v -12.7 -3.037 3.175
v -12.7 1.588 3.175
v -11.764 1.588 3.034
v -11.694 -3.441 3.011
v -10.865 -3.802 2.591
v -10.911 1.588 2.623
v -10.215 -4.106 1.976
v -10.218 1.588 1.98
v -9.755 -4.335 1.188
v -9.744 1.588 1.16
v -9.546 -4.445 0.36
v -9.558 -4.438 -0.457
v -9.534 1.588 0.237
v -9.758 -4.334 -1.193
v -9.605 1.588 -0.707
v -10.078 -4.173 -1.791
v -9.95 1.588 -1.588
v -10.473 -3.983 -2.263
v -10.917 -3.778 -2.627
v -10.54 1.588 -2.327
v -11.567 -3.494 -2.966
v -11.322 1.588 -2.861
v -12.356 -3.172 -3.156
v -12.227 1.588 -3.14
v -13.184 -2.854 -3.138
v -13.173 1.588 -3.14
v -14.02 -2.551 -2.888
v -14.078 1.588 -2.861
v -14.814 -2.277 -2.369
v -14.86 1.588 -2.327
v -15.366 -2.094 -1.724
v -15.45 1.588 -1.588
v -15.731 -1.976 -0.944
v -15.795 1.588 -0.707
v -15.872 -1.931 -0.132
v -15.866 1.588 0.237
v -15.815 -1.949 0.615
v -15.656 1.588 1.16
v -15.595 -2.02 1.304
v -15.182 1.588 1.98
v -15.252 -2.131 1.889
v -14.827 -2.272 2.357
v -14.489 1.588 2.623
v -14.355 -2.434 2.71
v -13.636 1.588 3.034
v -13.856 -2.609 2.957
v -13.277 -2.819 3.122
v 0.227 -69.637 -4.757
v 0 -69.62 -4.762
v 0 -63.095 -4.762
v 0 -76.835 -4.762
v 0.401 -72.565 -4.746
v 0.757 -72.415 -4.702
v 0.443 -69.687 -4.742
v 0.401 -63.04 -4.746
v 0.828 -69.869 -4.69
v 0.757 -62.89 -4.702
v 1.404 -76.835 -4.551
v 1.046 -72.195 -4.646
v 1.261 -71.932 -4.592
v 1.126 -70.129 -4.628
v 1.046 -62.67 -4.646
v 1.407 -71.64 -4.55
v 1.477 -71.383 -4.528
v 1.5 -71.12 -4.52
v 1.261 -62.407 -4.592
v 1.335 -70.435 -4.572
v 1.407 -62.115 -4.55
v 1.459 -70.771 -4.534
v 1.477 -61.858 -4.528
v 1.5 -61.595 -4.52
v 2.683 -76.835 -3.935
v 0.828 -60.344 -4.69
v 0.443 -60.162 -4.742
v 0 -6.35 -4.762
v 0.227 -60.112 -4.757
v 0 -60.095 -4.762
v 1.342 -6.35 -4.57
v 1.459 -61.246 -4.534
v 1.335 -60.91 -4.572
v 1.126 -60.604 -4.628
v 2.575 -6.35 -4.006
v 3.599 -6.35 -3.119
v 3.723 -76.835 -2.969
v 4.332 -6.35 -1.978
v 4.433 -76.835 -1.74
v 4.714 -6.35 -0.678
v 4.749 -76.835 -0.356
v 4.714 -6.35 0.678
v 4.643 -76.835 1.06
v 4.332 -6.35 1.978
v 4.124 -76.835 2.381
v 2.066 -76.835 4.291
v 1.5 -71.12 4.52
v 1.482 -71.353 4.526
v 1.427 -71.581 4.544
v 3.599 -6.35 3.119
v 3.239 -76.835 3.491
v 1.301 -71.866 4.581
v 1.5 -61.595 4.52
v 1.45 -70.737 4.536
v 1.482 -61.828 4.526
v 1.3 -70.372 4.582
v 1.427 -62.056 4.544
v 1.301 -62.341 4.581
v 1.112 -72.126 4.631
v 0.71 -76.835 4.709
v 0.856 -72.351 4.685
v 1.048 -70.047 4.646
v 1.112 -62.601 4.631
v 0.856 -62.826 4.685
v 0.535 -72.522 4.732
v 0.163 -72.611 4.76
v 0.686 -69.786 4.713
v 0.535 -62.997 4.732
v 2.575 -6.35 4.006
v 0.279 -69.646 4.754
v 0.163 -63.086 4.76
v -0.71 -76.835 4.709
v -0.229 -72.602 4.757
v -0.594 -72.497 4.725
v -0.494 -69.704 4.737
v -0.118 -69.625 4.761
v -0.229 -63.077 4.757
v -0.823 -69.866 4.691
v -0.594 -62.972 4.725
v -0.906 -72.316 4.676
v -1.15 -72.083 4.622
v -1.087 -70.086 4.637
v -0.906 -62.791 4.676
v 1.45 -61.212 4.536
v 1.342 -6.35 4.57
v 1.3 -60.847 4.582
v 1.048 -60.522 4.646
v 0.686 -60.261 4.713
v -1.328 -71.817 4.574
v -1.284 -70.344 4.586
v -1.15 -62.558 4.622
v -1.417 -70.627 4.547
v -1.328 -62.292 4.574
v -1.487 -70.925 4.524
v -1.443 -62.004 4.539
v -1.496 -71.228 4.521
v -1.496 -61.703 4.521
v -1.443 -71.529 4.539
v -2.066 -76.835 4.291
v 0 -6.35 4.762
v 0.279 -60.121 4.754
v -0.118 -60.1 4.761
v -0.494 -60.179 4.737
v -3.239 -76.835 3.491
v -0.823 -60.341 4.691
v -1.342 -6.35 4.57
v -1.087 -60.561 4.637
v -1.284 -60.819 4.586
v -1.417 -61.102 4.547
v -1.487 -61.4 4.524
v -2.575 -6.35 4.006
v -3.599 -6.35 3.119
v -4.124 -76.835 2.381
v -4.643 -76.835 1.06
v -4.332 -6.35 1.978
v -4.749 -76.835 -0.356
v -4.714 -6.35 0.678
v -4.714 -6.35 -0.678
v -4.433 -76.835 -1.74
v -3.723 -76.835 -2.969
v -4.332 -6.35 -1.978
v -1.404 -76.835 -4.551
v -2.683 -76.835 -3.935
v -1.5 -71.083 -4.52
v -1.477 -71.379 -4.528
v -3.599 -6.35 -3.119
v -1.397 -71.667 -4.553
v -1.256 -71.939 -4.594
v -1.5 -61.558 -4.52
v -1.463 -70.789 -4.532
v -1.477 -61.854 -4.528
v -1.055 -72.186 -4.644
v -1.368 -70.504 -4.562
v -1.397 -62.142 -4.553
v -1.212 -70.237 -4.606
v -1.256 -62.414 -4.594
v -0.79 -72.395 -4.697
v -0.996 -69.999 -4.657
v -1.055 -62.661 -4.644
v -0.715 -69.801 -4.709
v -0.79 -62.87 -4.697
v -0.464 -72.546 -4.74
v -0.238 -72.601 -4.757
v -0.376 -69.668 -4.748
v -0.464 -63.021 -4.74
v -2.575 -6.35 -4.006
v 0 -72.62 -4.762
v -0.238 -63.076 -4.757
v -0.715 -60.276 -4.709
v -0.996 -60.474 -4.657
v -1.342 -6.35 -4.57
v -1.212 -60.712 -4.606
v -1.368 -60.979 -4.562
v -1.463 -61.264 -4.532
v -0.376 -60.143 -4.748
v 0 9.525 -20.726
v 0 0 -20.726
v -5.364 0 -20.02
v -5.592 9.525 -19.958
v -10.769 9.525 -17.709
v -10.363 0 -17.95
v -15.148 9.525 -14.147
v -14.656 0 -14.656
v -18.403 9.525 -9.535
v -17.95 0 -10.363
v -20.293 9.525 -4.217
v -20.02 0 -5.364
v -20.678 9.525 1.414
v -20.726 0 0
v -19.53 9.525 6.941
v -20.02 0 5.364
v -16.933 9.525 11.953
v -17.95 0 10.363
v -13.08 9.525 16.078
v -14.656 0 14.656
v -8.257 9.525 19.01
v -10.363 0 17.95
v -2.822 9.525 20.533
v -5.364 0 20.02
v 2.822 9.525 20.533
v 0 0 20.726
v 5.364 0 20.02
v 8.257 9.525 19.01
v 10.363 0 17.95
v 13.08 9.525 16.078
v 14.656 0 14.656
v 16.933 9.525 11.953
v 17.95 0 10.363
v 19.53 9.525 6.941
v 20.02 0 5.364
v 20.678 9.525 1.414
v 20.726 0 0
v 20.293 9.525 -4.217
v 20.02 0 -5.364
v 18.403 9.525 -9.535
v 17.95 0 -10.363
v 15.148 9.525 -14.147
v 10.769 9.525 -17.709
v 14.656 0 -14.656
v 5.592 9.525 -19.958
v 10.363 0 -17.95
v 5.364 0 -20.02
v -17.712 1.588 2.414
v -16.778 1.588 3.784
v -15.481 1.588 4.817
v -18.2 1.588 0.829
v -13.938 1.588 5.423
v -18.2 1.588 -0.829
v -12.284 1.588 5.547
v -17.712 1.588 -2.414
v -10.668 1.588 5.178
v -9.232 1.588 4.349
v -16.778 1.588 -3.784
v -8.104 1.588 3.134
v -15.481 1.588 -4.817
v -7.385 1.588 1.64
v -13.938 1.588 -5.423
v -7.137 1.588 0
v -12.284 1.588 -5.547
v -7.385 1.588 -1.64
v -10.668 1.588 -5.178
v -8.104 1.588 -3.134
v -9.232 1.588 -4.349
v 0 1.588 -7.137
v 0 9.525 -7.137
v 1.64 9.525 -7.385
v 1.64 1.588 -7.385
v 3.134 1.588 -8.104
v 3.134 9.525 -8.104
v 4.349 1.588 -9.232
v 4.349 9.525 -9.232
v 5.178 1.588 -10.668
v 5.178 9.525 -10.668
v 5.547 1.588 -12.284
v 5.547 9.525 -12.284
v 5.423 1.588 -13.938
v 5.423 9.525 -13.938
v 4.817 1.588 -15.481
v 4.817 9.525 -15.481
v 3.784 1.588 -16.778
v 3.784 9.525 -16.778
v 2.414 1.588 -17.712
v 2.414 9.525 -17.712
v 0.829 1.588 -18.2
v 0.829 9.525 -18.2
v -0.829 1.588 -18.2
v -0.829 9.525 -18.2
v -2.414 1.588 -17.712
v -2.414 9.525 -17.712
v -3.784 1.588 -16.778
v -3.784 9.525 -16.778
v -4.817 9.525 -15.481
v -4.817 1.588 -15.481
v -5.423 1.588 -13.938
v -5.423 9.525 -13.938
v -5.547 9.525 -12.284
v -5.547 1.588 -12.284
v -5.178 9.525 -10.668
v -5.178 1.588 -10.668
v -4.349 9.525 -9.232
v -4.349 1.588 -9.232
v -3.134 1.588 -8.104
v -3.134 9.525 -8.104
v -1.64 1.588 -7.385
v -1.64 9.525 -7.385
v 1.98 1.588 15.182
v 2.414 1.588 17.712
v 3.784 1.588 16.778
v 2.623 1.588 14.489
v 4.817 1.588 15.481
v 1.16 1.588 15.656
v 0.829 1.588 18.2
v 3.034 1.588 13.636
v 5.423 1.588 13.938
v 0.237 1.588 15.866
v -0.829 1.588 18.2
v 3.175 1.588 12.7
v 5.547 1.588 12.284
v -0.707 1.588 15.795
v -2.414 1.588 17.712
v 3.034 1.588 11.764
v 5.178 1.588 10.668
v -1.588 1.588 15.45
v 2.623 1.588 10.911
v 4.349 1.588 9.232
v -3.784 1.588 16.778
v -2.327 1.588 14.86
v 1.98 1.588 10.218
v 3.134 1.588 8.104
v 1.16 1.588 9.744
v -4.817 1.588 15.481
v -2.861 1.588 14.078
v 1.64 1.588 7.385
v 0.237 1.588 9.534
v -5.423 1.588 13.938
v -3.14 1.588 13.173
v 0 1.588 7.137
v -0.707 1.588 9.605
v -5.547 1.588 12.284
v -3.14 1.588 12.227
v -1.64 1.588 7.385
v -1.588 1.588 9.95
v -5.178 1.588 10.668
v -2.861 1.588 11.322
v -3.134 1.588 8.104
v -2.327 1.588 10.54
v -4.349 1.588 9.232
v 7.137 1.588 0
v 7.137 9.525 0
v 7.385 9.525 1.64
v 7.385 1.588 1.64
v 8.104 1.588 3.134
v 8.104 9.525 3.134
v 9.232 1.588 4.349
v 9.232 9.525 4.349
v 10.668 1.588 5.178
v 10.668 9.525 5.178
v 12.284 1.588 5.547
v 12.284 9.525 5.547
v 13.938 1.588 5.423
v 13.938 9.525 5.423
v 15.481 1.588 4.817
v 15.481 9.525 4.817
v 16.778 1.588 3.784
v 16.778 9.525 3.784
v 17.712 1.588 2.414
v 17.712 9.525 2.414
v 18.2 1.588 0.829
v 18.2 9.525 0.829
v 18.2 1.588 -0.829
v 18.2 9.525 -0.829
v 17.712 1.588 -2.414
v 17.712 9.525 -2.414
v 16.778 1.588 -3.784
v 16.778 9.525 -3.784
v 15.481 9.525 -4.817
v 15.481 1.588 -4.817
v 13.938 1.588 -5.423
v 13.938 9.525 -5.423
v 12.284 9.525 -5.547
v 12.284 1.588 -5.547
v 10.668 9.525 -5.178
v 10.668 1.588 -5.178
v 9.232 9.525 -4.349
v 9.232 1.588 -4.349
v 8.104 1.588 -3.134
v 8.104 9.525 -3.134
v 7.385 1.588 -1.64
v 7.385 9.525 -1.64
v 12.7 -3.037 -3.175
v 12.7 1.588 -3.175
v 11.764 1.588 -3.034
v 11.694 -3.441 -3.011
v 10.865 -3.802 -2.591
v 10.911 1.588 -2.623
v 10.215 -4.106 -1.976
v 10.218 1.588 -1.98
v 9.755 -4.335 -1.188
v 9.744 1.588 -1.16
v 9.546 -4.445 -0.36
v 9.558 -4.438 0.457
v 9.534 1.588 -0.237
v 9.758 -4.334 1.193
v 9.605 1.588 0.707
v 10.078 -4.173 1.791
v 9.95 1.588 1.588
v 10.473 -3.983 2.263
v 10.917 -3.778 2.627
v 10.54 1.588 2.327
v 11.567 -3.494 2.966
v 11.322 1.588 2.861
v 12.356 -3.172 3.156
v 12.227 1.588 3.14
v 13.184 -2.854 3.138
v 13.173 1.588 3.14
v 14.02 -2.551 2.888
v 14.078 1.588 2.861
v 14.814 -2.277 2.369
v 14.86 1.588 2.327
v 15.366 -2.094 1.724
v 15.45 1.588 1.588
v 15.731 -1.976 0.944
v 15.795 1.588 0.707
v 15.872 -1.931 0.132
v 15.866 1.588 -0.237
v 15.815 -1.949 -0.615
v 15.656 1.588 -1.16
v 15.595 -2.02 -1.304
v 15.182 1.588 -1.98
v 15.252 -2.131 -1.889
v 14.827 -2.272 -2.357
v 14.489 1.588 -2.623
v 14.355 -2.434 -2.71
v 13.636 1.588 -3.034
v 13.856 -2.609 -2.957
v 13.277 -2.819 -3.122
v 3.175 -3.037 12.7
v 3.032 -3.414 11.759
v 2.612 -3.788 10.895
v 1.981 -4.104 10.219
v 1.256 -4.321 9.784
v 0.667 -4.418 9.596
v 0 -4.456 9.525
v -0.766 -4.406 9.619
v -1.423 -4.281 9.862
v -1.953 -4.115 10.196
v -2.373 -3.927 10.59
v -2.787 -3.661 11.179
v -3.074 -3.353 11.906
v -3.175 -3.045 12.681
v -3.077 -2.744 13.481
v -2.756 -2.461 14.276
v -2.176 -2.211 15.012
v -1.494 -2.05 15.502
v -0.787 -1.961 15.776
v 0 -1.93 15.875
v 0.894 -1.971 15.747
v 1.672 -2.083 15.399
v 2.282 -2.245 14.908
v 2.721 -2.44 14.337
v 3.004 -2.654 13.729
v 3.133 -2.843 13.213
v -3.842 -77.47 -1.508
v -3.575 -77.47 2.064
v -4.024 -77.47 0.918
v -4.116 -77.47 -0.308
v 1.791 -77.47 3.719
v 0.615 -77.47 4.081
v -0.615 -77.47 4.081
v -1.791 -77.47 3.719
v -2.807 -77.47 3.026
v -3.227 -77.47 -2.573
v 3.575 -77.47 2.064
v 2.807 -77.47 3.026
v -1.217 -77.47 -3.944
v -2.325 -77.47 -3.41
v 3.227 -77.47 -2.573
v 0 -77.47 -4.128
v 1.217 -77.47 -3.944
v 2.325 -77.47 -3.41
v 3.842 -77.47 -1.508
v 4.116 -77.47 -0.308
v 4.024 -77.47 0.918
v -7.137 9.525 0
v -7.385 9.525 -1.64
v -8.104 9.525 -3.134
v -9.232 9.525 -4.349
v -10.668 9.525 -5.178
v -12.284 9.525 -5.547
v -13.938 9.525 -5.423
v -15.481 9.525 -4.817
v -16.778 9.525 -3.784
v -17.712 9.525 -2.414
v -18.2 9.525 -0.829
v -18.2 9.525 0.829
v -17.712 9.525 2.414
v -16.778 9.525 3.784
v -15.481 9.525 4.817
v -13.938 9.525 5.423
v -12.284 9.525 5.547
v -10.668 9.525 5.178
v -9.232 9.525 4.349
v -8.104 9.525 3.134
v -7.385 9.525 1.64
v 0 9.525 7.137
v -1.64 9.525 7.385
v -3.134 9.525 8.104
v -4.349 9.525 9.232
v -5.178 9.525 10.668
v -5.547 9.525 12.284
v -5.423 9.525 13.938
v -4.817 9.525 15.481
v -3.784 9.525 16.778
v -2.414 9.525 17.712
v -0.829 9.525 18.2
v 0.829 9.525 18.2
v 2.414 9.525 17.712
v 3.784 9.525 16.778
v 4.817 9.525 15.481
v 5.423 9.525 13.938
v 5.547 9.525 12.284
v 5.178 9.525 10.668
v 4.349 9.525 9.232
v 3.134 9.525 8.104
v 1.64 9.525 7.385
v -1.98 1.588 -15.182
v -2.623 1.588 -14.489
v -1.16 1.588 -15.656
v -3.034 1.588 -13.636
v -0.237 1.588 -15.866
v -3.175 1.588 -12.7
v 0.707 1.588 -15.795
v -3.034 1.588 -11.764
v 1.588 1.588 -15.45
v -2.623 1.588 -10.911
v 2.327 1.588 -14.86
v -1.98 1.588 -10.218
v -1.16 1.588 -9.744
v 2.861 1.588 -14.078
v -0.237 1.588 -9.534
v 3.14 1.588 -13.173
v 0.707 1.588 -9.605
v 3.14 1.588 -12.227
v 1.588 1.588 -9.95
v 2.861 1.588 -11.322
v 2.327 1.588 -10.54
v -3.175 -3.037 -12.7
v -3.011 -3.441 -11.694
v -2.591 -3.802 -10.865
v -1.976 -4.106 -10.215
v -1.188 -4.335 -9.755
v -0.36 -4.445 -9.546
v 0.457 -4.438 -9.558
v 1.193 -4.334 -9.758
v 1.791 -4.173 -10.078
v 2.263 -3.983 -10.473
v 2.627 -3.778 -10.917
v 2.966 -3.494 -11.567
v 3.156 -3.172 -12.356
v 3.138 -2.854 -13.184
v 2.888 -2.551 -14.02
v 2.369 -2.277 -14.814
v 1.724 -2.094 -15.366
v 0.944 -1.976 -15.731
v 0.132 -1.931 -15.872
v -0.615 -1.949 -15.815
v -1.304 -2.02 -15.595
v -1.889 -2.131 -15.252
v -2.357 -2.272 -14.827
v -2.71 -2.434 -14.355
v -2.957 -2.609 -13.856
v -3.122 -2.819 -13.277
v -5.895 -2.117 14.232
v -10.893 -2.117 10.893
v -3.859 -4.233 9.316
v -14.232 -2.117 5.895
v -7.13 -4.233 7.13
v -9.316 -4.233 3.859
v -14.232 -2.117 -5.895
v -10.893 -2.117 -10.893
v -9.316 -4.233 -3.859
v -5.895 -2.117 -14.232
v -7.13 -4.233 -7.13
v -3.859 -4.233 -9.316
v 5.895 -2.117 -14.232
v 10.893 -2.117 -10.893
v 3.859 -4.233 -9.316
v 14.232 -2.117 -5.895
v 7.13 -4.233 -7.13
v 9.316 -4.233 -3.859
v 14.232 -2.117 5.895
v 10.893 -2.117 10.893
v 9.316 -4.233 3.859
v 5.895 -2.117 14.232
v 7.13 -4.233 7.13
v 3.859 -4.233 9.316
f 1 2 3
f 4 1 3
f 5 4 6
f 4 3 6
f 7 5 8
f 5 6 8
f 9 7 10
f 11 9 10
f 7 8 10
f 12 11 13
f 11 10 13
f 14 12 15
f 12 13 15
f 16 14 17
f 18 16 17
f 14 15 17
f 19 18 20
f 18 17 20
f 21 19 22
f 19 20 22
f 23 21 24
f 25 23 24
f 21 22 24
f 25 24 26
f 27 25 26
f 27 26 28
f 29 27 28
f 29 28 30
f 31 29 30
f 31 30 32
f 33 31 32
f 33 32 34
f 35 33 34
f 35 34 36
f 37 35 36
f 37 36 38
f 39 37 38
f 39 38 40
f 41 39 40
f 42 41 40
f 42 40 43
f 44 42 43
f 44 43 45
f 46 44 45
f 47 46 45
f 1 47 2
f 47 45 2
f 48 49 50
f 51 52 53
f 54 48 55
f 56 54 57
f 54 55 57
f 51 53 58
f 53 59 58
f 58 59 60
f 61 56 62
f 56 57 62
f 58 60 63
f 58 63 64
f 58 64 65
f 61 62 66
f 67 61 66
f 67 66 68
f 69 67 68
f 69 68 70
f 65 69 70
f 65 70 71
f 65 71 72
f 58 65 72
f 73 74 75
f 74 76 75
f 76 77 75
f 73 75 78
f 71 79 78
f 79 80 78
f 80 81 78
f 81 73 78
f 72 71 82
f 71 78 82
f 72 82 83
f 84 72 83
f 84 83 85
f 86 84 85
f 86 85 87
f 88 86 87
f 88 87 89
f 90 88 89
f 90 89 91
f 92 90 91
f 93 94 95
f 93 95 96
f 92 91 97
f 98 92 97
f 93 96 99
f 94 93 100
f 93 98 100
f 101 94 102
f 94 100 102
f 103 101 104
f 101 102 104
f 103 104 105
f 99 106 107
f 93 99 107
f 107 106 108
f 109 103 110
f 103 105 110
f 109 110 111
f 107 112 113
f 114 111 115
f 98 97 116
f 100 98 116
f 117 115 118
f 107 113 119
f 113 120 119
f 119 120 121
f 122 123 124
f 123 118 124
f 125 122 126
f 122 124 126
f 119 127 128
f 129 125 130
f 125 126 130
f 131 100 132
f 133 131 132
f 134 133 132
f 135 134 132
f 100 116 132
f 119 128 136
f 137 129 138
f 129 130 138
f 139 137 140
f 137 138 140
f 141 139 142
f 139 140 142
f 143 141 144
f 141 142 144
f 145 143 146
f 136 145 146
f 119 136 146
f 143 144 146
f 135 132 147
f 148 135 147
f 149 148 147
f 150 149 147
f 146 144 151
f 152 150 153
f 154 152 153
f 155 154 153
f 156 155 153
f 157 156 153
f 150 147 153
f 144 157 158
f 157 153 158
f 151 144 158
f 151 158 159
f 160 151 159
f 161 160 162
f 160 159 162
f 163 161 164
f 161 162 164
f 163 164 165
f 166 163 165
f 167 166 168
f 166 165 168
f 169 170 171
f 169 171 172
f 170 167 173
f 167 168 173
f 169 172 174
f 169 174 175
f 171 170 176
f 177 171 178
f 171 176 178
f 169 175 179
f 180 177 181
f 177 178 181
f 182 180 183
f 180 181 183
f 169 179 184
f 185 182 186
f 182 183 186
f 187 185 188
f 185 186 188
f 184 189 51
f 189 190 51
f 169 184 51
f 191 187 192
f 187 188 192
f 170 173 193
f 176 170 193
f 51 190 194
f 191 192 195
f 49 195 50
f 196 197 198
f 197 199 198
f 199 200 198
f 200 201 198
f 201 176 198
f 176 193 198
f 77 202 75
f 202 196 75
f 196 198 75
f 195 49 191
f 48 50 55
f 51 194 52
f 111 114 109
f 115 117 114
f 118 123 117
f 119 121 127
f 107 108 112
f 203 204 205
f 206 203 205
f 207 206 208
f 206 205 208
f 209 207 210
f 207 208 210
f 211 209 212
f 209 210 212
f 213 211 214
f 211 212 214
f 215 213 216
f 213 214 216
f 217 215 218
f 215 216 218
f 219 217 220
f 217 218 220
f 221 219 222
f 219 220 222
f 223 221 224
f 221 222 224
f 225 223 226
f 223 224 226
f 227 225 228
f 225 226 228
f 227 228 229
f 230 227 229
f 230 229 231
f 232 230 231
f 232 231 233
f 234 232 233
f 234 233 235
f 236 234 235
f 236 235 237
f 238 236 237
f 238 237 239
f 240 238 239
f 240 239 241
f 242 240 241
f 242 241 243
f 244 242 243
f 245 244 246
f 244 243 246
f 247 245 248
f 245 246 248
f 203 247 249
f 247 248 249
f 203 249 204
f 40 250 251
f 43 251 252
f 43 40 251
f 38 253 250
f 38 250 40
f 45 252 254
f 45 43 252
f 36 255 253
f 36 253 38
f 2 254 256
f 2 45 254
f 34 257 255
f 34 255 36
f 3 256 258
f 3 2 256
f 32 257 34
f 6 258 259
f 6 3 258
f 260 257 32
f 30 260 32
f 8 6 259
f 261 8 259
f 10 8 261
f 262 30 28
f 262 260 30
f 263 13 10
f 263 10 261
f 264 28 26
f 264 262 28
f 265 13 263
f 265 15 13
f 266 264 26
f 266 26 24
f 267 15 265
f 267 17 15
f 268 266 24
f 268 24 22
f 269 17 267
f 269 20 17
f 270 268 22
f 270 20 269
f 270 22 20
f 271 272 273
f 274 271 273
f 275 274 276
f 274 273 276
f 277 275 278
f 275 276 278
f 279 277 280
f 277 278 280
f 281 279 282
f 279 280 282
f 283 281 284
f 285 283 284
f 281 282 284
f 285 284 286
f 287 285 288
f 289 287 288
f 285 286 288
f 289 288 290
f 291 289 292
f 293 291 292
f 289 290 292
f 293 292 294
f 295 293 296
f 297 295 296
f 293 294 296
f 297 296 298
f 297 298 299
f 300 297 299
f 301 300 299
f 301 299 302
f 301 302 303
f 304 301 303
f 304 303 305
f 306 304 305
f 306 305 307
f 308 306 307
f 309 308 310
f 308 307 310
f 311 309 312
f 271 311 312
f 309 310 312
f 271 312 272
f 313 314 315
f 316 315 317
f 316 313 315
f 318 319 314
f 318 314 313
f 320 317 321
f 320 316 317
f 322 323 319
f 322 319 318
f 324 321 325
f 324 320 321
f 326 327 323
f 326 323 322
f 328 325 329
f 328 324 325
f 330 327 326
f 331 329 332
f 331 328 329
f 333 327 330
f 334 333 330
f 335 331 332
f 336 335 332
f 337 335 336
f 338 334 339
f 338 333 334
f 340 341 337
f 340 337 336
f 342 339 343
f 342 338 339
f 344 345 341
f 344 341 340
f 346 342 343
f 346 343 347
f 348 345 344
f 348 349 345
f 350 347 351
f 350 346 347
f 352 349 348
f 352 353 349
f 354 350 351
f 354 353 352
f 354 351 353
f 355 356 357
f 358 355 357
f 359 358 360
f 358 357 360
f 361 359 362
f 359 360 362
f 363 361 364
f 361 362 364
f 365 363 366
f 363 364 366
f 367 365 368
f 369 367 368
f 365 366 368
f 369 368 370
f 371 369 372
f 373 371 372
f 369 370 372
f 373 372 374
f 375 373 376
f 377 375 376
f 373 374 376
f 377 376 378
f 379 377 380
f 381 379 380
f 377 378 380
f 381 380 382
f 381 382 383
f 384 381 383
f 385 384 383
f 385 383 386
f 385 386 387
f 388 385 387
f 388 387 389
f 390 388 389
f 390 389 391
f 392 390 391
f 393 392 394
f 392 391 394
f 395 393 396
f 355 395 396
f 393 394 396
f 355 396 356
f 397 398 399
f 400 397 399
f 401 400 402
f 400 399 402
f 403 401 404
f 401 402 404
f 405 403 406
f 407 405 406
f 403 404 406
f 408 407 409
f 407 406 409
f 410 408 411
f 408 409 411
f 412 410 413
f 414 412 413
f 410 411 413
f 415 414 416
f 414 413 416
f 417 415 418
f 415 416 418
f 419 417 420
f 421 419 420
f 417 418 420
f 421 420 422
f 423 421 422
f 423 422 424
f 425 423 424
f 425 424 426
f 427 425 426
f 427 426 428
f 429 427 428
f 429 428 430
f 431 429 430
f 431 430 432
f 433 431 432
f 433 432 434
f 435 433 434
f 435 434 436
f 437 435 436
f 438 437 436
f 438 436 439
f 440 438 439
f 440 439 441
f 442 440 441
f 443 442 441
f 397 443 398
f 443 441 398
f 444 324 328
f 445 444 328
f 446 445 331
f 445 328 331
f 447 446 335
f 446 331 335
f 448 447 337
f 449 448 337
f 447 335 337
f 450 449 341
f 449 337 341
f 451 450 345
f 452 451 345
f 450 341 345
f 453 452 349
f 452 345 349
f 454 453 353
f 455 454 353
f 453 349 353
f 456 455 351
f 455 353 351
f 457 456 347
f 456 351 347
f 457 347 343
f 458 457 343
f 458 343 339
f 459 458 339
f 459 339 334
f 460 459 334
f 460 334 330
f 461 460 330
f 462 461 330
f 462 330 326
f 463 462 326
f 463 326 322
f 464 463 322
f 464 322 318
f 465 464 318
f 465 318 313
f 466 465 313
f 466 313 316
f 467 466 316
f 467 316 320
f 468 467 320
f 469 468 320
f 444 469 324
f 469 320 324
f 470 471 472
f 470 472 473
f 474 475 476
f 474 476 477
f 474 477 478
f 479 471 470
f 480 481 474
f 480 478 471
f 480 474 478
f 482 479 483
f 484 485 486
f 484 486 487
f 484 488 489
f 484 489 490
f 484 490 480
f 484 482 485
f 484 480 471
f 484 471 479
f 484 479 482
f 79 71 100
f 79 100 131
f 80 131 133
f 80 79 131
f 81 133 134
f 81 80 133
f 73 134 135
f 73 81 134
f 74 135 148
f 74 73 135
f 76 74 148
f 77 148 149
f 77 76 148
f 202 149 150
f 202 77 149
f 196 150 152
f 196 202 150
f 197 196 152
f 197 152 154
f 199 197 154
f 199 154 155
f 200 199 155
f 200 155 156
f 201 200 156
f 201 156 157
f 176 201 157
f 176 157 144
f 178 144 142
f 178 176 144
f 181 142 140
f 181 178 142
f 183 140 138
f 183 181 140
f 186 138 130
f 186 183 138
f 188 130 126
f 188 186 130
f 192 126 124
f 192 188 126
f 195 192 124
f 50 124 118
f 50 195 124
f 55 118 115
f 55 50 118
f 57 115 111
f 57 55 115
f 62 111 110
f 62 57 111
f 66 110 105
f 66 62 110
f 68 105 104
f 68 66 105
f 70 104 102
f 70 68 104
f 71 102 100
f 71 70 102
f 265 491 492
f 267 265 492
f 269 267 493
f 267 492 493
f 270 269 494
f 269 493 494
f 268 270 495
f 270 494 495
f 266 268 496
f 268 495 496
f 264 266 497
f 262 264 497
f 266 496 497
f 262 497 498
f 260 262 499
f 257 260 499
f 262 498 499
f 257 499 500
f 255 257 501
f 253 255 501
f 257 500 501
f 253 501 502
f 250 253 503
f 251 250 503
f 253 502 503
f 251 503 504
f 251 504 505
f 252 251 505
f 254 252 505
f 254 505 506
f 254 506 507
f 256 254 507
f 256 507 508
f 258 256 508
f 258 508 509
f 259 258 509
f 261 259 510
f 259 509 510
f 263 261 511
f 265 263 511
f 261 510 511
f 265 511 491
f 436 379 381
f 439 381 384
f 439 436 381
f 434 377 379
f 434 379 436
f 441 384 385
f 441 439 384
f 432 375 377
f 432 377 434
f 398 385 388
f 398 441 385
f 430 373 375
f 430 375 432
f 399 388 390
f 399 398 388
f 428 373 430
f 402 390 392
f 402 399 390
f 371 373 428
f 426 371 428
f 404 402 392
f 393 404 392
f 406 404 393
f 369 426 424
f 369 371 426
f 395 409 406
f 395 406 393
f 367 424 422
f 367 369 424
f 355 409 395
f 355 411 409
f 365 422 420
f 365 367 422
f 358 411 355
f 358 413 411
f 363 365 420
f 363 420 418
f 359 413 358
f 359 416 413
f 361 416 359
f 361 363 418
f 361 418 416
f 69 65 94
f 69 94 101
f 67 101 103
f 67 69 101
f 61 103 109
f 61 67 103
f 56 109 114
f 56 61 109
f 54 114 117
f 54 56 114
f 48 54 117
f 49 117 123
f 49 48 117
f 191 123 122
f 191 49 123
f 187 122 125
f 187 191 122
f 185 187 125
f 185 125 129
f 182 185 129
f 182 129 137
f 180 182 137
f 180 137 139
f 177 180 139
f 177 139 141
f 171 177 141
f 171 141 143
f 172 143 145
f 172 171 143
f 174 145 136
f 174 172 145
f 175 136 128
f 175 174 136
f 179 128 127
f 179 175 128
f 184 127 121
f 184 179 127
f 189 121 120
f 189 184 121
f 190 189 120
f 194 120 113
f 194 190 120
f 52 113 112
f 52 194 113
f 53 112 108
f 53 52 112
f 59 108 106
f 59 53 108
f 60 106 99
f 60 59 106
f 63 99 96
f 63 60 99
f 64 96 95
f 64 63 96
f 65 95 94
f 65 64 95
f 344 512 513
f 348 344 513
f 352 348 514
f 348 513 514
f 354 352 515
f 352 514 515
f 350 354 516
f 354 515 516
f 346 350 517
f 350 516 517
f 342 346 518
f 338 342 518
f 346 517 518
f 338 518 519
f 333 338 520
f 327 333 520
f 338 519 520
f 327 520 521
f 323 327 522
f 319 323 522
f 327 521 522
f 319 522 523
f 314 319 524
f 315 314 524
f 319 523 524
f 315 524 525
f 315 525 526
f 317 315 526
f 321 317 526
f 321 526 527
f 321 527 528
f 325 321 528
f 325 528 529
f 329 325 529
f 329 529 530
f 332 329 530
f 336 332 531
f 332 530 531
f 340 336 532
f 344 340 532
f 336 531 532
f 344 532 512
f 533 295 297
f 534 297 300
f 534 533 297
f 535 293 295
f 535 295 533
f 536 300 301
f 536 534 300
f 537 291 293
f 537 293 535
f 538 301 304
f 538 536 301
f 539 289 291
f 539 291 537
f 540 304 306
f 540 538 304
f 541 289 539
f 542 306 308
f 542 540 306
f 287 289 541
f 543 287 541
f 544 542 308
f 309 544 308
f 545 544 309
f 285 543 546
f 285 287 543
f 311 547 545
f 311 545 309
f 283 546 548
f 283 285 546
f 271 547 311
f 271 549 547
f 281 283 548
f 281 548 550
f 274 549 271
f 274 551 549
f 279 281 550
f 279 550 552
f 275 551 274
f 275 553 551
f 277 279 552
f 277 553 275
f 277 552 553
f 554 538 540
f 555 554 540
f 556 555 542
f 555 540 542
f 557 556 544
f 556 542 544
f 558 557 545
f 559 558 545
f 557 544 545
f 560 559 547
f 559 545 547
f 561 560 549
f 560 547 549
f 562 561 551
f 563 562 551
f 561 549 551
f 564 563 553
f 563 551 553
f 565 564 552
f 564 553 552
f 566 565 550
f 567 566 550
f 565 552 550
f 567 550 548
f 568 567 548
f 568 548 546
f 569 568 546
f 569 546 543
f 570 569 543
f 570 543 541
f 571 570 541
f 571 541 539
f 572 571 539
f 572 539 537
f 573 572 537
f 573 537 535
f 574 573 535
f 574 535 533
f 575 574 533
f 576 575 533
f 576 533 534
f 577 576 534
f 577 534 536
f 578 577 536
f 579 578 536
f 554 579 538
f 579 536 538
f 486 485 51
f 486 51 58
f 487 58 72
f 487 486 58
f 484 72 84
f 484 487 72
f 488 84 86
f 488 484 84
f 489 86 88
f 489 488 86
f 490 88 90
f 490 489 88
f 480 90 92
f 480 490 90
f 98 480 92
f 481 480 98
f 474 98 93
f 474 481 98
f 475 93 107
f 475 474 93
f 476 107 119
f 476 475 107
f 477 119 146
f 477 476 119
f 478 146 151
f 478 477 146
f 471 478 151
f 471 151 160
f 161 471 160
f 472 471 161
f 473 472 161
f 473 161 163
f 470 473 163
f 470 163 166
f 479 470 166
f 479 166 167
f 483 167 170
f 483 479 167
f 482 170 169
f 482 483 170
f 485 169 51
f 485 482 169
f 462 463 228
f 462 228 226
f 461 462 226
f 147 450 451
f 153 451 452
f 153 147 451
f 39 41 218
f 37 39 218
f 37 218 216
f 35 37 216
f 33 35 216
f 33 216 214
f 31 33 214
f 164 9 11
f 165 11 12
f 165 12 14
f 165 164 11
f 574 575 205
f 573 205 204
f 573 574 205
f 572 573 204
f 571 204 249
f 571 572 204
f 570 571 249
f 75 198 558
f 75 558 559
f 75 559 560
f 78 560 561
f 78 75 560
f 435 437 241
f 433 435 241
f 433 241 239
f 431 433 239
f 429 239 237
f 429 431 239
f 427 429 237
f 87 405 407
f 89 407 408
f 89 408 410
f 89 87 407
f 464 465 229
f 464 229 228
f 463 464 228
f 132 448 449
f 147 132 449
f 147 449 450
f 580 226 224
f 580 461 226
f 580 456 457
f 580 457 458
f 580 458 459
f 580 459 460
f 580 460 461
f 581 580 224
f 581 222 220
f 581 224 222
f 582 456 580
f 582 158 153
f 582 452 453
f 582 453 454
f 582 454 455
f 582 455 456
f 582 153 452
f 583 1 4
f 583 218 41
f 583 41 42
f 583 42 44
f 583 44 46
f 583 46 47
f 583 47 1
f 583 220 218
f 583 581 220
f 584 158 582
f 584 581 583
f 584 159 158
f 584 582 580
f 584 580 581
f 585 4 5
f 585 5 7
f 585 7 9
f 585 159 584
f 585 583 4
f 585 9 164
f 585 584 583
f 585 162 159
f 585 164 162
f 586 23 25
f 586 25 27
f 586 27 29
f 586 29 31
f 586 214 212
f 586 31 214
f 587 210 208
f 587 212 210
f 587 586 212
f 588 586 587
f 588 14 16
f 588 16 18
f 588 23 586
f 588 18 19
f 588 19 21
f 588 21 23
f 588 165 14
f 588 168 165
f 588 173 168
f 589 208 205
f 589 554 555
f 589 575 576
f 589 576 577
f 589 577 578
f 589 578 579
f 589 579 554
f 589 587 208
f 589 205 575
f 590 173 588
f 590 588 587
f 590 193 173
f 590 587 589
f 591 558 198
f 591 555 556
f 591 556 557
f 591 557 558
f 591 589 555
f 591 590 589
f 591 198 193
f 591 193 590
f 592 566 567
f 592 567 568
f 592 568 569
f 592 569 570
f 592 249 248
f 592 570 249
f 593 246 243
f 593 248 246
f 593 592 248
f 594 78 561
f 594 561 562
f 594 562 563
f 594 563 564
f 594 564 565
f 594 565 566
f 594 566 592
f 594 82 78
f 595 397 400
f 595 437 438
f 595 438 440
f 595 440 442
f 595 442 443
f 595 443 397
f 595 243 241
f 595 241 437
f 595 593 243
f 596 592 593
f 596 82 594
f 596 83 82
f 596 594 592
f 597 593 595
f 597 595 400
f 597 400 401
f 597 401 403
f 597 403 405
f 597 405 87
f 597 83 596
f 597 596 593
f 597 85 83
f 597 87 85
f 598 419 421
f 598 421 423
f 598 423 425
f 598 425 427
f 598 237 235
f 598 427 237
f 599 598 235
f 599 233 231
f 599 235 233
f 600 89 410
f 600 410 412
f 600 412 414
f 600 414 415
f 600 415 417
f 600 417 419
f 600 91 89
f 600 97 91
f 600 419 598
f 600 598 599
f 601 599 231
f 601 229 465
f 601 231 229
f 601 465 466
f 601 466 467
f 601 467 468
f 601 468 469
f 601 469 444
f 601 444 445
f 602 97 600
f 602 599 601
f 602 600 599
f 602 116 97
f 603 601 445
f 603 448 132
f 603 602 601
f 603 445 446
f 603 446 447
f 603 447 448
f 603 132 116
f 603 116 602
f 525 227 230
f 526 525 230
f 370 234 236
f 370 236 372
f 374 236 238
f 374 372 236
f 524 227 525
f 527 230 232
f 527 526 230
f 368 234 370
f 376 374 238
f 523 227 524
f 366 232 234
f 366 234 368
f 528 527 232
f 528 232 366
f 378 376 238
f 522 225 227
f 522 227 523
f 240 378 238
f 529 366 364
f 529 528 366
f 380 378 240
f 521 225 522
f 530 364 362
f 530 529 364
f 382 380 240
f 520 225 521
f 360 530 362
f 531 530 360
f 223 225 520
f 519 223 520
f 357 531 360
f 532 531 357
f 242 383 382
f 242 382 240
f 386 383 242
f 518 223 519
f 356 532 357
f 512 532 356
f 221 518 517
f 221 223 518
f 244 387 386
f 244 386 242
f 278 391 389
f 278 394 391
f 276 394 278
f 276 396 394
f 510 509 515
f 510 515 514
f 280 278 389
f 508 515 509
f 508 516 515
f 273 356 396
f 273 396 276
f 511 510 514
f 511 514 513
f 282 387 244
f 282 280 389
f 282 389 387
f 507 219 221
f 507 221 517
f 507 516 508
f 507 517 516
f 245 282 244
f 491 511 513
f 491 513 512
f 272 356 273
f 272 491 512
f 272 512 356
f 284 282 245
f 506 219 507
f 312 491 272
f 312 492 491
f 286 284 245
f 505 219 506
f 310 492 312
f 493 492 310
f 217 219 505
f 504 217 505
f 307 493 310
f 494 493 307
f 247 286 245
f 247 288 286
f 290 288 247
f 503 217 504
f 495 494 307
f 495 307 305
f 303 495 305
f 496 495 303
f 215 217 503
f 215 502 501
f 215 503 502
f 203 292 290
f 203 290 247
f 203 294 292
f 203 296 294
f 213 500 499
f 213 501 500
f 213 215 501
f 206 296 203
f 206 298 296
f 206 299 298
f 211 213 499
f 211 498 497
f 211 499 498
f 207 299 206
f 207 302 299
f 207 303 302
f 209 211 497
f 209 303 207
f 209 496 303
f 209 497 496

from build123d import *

# Parameters (mm, degrees)
SKETCH1_R               = 20.7264
BOSS_EXTRUDE1_DEPTH     = 9.525
SKETCH2_R               = 5.5626
CUT_EXTRUDE1_DEPTH      = 7.9375
CIRPATTERN1_COUNT       = 4
SKETCH3_R               = 4.7625
BOSS_EXTRUDE2_DEPTH     = 77.47
CUT_EXTRUDE2_DEPTH      = 83.8297544
CUT_EXTRUDE2_DEPTH_BACK = 83.8297544
SKETCH5_R               = 1.5
SKETCH6_R               = 3.175
CUT_EXTRUDE3_DEPTH      = 85.316401939
CIRPATTERN2_COUNT       = 4
CHAMFER1_SIZE           = 0.635


with BuildPart() as part:
    # Sketch1 → Boss-Extrude1 (new body)
    with BuildSketch(Plane(origin=(0, 0, 0), x_dir=(1, 0, 0), z_dir=(0, 1, 0))):
        with Locations(Location((0, 0, 0), (0, 0, 90))):
            Circle(SKETCH1_R)
    extrude(amount=BOSS_EXTRUDE1_DEPTH)

    # Sketch2 → Cut-Extrude1 (cut)
    with BuildSketch(Plane(origin=(0, 9.525, 0), x_dir=(1, 0, 0), z_dir=(0, 1, 0))):
        with Locations(Location((0, 12.7, 0), (0, 0, 270))):
            Circle(SKETCH2_R)
    cut_extrude1 = extrude(amount=-CUT_EXTRUDE1_DEPTH, mode=Mode.SUBTRACT)

    # CirPattern1: Cut-Extrude1 ×4 about axis
    cirpattern1_axis = Axis((0, 0, 0), (0, 1, 0))
    for i in range(1, CIRPATTERN1_COUNT):
        add(cut_extrude1.rotate(cirpattern1_axis, i * 360 / CIRPATTERN1_COUNT), mode=Mode.SUBTRACT)

    # Sketch3 → Boss-Extrude2 (add)
    with BuildSketch(Plane.XZ):
        with Locations(Location((0, 0, 0), (0, 0, 270))):
            Circle(SKETCH3_R)
    extrude(amount=BOSS_EXTRUDE2_DEPTH)

    # Sketch4 → Revolve1 (revolve)
    with BuildSketch(Plane.XY, mode=Mode.PRIVATE) as revolve1_sk:
        Polygon((-20.7264, 0), (-4.7625, -6.35), (-4.7625, 0), align=None)
    revolve(revolve1_sk.sketch.rotate(Axis((0, 0, 0), (0, -1, 0)), 270), axis=Axis((0, 0, 0), (0, -1, 0)))

    # Sketch5 → Cut-Extrude2 (cut, two sides: drawn at the far end of the back side and taken through both)
    with BuildSketch(Plane.XY.offset(-CUT_EXTRUDE2_DEPTH_BACK)):
        with Locations((0, -71.12)):
            Circle(SKETCH5_R)
        with Locations((0, -61.595)):
            Circle(SKETCH5_R)
    extrude(amount=CUT_EXTRUDE2_DEPTH + CUT_EXTRUDE2_DEPTH_BACK, mode=Mode.SUBTRACT)

    # Sketch6 → Cut-Extrude3 (cut, through all)
    with BuildSketch(Plane(origin=(0, 1.5875, 0), x_dir=(1, 0, 0), z_dir=(0, 1, 0))):
        with Locations(Location((-12.7, 0, 0), (0, 0, 270))):
            Circle(SKETCH6_R)
    cut_extrude3 = extrude(amount=-CUT_EXTRUDE3_DEPTH, mode=Mode.SUBTRACT)

    # CirPattern2: Cut-Extrude3 ×4 about axis
    cirpattern2_axis = Axis((0, 0, 0), (0, 1, 0))
    for i in range(1, CIRPATTERN2_COUNT):
        add(cut_extrude3.rotate(cirpattern2_axis, i * 360 / CIRPATTERN2_COUNT), mode=Mode.SUBTRACT)

    # Chamfer1
    chamfer1_edges = [part.edges().sort_by_distance(p)[0] for p in [
        (0, -77.47, 4.7625),
    ]]
    chamfer(chamfer1_edges, length=CHAMFER1_SIZE)


solid = part.part
